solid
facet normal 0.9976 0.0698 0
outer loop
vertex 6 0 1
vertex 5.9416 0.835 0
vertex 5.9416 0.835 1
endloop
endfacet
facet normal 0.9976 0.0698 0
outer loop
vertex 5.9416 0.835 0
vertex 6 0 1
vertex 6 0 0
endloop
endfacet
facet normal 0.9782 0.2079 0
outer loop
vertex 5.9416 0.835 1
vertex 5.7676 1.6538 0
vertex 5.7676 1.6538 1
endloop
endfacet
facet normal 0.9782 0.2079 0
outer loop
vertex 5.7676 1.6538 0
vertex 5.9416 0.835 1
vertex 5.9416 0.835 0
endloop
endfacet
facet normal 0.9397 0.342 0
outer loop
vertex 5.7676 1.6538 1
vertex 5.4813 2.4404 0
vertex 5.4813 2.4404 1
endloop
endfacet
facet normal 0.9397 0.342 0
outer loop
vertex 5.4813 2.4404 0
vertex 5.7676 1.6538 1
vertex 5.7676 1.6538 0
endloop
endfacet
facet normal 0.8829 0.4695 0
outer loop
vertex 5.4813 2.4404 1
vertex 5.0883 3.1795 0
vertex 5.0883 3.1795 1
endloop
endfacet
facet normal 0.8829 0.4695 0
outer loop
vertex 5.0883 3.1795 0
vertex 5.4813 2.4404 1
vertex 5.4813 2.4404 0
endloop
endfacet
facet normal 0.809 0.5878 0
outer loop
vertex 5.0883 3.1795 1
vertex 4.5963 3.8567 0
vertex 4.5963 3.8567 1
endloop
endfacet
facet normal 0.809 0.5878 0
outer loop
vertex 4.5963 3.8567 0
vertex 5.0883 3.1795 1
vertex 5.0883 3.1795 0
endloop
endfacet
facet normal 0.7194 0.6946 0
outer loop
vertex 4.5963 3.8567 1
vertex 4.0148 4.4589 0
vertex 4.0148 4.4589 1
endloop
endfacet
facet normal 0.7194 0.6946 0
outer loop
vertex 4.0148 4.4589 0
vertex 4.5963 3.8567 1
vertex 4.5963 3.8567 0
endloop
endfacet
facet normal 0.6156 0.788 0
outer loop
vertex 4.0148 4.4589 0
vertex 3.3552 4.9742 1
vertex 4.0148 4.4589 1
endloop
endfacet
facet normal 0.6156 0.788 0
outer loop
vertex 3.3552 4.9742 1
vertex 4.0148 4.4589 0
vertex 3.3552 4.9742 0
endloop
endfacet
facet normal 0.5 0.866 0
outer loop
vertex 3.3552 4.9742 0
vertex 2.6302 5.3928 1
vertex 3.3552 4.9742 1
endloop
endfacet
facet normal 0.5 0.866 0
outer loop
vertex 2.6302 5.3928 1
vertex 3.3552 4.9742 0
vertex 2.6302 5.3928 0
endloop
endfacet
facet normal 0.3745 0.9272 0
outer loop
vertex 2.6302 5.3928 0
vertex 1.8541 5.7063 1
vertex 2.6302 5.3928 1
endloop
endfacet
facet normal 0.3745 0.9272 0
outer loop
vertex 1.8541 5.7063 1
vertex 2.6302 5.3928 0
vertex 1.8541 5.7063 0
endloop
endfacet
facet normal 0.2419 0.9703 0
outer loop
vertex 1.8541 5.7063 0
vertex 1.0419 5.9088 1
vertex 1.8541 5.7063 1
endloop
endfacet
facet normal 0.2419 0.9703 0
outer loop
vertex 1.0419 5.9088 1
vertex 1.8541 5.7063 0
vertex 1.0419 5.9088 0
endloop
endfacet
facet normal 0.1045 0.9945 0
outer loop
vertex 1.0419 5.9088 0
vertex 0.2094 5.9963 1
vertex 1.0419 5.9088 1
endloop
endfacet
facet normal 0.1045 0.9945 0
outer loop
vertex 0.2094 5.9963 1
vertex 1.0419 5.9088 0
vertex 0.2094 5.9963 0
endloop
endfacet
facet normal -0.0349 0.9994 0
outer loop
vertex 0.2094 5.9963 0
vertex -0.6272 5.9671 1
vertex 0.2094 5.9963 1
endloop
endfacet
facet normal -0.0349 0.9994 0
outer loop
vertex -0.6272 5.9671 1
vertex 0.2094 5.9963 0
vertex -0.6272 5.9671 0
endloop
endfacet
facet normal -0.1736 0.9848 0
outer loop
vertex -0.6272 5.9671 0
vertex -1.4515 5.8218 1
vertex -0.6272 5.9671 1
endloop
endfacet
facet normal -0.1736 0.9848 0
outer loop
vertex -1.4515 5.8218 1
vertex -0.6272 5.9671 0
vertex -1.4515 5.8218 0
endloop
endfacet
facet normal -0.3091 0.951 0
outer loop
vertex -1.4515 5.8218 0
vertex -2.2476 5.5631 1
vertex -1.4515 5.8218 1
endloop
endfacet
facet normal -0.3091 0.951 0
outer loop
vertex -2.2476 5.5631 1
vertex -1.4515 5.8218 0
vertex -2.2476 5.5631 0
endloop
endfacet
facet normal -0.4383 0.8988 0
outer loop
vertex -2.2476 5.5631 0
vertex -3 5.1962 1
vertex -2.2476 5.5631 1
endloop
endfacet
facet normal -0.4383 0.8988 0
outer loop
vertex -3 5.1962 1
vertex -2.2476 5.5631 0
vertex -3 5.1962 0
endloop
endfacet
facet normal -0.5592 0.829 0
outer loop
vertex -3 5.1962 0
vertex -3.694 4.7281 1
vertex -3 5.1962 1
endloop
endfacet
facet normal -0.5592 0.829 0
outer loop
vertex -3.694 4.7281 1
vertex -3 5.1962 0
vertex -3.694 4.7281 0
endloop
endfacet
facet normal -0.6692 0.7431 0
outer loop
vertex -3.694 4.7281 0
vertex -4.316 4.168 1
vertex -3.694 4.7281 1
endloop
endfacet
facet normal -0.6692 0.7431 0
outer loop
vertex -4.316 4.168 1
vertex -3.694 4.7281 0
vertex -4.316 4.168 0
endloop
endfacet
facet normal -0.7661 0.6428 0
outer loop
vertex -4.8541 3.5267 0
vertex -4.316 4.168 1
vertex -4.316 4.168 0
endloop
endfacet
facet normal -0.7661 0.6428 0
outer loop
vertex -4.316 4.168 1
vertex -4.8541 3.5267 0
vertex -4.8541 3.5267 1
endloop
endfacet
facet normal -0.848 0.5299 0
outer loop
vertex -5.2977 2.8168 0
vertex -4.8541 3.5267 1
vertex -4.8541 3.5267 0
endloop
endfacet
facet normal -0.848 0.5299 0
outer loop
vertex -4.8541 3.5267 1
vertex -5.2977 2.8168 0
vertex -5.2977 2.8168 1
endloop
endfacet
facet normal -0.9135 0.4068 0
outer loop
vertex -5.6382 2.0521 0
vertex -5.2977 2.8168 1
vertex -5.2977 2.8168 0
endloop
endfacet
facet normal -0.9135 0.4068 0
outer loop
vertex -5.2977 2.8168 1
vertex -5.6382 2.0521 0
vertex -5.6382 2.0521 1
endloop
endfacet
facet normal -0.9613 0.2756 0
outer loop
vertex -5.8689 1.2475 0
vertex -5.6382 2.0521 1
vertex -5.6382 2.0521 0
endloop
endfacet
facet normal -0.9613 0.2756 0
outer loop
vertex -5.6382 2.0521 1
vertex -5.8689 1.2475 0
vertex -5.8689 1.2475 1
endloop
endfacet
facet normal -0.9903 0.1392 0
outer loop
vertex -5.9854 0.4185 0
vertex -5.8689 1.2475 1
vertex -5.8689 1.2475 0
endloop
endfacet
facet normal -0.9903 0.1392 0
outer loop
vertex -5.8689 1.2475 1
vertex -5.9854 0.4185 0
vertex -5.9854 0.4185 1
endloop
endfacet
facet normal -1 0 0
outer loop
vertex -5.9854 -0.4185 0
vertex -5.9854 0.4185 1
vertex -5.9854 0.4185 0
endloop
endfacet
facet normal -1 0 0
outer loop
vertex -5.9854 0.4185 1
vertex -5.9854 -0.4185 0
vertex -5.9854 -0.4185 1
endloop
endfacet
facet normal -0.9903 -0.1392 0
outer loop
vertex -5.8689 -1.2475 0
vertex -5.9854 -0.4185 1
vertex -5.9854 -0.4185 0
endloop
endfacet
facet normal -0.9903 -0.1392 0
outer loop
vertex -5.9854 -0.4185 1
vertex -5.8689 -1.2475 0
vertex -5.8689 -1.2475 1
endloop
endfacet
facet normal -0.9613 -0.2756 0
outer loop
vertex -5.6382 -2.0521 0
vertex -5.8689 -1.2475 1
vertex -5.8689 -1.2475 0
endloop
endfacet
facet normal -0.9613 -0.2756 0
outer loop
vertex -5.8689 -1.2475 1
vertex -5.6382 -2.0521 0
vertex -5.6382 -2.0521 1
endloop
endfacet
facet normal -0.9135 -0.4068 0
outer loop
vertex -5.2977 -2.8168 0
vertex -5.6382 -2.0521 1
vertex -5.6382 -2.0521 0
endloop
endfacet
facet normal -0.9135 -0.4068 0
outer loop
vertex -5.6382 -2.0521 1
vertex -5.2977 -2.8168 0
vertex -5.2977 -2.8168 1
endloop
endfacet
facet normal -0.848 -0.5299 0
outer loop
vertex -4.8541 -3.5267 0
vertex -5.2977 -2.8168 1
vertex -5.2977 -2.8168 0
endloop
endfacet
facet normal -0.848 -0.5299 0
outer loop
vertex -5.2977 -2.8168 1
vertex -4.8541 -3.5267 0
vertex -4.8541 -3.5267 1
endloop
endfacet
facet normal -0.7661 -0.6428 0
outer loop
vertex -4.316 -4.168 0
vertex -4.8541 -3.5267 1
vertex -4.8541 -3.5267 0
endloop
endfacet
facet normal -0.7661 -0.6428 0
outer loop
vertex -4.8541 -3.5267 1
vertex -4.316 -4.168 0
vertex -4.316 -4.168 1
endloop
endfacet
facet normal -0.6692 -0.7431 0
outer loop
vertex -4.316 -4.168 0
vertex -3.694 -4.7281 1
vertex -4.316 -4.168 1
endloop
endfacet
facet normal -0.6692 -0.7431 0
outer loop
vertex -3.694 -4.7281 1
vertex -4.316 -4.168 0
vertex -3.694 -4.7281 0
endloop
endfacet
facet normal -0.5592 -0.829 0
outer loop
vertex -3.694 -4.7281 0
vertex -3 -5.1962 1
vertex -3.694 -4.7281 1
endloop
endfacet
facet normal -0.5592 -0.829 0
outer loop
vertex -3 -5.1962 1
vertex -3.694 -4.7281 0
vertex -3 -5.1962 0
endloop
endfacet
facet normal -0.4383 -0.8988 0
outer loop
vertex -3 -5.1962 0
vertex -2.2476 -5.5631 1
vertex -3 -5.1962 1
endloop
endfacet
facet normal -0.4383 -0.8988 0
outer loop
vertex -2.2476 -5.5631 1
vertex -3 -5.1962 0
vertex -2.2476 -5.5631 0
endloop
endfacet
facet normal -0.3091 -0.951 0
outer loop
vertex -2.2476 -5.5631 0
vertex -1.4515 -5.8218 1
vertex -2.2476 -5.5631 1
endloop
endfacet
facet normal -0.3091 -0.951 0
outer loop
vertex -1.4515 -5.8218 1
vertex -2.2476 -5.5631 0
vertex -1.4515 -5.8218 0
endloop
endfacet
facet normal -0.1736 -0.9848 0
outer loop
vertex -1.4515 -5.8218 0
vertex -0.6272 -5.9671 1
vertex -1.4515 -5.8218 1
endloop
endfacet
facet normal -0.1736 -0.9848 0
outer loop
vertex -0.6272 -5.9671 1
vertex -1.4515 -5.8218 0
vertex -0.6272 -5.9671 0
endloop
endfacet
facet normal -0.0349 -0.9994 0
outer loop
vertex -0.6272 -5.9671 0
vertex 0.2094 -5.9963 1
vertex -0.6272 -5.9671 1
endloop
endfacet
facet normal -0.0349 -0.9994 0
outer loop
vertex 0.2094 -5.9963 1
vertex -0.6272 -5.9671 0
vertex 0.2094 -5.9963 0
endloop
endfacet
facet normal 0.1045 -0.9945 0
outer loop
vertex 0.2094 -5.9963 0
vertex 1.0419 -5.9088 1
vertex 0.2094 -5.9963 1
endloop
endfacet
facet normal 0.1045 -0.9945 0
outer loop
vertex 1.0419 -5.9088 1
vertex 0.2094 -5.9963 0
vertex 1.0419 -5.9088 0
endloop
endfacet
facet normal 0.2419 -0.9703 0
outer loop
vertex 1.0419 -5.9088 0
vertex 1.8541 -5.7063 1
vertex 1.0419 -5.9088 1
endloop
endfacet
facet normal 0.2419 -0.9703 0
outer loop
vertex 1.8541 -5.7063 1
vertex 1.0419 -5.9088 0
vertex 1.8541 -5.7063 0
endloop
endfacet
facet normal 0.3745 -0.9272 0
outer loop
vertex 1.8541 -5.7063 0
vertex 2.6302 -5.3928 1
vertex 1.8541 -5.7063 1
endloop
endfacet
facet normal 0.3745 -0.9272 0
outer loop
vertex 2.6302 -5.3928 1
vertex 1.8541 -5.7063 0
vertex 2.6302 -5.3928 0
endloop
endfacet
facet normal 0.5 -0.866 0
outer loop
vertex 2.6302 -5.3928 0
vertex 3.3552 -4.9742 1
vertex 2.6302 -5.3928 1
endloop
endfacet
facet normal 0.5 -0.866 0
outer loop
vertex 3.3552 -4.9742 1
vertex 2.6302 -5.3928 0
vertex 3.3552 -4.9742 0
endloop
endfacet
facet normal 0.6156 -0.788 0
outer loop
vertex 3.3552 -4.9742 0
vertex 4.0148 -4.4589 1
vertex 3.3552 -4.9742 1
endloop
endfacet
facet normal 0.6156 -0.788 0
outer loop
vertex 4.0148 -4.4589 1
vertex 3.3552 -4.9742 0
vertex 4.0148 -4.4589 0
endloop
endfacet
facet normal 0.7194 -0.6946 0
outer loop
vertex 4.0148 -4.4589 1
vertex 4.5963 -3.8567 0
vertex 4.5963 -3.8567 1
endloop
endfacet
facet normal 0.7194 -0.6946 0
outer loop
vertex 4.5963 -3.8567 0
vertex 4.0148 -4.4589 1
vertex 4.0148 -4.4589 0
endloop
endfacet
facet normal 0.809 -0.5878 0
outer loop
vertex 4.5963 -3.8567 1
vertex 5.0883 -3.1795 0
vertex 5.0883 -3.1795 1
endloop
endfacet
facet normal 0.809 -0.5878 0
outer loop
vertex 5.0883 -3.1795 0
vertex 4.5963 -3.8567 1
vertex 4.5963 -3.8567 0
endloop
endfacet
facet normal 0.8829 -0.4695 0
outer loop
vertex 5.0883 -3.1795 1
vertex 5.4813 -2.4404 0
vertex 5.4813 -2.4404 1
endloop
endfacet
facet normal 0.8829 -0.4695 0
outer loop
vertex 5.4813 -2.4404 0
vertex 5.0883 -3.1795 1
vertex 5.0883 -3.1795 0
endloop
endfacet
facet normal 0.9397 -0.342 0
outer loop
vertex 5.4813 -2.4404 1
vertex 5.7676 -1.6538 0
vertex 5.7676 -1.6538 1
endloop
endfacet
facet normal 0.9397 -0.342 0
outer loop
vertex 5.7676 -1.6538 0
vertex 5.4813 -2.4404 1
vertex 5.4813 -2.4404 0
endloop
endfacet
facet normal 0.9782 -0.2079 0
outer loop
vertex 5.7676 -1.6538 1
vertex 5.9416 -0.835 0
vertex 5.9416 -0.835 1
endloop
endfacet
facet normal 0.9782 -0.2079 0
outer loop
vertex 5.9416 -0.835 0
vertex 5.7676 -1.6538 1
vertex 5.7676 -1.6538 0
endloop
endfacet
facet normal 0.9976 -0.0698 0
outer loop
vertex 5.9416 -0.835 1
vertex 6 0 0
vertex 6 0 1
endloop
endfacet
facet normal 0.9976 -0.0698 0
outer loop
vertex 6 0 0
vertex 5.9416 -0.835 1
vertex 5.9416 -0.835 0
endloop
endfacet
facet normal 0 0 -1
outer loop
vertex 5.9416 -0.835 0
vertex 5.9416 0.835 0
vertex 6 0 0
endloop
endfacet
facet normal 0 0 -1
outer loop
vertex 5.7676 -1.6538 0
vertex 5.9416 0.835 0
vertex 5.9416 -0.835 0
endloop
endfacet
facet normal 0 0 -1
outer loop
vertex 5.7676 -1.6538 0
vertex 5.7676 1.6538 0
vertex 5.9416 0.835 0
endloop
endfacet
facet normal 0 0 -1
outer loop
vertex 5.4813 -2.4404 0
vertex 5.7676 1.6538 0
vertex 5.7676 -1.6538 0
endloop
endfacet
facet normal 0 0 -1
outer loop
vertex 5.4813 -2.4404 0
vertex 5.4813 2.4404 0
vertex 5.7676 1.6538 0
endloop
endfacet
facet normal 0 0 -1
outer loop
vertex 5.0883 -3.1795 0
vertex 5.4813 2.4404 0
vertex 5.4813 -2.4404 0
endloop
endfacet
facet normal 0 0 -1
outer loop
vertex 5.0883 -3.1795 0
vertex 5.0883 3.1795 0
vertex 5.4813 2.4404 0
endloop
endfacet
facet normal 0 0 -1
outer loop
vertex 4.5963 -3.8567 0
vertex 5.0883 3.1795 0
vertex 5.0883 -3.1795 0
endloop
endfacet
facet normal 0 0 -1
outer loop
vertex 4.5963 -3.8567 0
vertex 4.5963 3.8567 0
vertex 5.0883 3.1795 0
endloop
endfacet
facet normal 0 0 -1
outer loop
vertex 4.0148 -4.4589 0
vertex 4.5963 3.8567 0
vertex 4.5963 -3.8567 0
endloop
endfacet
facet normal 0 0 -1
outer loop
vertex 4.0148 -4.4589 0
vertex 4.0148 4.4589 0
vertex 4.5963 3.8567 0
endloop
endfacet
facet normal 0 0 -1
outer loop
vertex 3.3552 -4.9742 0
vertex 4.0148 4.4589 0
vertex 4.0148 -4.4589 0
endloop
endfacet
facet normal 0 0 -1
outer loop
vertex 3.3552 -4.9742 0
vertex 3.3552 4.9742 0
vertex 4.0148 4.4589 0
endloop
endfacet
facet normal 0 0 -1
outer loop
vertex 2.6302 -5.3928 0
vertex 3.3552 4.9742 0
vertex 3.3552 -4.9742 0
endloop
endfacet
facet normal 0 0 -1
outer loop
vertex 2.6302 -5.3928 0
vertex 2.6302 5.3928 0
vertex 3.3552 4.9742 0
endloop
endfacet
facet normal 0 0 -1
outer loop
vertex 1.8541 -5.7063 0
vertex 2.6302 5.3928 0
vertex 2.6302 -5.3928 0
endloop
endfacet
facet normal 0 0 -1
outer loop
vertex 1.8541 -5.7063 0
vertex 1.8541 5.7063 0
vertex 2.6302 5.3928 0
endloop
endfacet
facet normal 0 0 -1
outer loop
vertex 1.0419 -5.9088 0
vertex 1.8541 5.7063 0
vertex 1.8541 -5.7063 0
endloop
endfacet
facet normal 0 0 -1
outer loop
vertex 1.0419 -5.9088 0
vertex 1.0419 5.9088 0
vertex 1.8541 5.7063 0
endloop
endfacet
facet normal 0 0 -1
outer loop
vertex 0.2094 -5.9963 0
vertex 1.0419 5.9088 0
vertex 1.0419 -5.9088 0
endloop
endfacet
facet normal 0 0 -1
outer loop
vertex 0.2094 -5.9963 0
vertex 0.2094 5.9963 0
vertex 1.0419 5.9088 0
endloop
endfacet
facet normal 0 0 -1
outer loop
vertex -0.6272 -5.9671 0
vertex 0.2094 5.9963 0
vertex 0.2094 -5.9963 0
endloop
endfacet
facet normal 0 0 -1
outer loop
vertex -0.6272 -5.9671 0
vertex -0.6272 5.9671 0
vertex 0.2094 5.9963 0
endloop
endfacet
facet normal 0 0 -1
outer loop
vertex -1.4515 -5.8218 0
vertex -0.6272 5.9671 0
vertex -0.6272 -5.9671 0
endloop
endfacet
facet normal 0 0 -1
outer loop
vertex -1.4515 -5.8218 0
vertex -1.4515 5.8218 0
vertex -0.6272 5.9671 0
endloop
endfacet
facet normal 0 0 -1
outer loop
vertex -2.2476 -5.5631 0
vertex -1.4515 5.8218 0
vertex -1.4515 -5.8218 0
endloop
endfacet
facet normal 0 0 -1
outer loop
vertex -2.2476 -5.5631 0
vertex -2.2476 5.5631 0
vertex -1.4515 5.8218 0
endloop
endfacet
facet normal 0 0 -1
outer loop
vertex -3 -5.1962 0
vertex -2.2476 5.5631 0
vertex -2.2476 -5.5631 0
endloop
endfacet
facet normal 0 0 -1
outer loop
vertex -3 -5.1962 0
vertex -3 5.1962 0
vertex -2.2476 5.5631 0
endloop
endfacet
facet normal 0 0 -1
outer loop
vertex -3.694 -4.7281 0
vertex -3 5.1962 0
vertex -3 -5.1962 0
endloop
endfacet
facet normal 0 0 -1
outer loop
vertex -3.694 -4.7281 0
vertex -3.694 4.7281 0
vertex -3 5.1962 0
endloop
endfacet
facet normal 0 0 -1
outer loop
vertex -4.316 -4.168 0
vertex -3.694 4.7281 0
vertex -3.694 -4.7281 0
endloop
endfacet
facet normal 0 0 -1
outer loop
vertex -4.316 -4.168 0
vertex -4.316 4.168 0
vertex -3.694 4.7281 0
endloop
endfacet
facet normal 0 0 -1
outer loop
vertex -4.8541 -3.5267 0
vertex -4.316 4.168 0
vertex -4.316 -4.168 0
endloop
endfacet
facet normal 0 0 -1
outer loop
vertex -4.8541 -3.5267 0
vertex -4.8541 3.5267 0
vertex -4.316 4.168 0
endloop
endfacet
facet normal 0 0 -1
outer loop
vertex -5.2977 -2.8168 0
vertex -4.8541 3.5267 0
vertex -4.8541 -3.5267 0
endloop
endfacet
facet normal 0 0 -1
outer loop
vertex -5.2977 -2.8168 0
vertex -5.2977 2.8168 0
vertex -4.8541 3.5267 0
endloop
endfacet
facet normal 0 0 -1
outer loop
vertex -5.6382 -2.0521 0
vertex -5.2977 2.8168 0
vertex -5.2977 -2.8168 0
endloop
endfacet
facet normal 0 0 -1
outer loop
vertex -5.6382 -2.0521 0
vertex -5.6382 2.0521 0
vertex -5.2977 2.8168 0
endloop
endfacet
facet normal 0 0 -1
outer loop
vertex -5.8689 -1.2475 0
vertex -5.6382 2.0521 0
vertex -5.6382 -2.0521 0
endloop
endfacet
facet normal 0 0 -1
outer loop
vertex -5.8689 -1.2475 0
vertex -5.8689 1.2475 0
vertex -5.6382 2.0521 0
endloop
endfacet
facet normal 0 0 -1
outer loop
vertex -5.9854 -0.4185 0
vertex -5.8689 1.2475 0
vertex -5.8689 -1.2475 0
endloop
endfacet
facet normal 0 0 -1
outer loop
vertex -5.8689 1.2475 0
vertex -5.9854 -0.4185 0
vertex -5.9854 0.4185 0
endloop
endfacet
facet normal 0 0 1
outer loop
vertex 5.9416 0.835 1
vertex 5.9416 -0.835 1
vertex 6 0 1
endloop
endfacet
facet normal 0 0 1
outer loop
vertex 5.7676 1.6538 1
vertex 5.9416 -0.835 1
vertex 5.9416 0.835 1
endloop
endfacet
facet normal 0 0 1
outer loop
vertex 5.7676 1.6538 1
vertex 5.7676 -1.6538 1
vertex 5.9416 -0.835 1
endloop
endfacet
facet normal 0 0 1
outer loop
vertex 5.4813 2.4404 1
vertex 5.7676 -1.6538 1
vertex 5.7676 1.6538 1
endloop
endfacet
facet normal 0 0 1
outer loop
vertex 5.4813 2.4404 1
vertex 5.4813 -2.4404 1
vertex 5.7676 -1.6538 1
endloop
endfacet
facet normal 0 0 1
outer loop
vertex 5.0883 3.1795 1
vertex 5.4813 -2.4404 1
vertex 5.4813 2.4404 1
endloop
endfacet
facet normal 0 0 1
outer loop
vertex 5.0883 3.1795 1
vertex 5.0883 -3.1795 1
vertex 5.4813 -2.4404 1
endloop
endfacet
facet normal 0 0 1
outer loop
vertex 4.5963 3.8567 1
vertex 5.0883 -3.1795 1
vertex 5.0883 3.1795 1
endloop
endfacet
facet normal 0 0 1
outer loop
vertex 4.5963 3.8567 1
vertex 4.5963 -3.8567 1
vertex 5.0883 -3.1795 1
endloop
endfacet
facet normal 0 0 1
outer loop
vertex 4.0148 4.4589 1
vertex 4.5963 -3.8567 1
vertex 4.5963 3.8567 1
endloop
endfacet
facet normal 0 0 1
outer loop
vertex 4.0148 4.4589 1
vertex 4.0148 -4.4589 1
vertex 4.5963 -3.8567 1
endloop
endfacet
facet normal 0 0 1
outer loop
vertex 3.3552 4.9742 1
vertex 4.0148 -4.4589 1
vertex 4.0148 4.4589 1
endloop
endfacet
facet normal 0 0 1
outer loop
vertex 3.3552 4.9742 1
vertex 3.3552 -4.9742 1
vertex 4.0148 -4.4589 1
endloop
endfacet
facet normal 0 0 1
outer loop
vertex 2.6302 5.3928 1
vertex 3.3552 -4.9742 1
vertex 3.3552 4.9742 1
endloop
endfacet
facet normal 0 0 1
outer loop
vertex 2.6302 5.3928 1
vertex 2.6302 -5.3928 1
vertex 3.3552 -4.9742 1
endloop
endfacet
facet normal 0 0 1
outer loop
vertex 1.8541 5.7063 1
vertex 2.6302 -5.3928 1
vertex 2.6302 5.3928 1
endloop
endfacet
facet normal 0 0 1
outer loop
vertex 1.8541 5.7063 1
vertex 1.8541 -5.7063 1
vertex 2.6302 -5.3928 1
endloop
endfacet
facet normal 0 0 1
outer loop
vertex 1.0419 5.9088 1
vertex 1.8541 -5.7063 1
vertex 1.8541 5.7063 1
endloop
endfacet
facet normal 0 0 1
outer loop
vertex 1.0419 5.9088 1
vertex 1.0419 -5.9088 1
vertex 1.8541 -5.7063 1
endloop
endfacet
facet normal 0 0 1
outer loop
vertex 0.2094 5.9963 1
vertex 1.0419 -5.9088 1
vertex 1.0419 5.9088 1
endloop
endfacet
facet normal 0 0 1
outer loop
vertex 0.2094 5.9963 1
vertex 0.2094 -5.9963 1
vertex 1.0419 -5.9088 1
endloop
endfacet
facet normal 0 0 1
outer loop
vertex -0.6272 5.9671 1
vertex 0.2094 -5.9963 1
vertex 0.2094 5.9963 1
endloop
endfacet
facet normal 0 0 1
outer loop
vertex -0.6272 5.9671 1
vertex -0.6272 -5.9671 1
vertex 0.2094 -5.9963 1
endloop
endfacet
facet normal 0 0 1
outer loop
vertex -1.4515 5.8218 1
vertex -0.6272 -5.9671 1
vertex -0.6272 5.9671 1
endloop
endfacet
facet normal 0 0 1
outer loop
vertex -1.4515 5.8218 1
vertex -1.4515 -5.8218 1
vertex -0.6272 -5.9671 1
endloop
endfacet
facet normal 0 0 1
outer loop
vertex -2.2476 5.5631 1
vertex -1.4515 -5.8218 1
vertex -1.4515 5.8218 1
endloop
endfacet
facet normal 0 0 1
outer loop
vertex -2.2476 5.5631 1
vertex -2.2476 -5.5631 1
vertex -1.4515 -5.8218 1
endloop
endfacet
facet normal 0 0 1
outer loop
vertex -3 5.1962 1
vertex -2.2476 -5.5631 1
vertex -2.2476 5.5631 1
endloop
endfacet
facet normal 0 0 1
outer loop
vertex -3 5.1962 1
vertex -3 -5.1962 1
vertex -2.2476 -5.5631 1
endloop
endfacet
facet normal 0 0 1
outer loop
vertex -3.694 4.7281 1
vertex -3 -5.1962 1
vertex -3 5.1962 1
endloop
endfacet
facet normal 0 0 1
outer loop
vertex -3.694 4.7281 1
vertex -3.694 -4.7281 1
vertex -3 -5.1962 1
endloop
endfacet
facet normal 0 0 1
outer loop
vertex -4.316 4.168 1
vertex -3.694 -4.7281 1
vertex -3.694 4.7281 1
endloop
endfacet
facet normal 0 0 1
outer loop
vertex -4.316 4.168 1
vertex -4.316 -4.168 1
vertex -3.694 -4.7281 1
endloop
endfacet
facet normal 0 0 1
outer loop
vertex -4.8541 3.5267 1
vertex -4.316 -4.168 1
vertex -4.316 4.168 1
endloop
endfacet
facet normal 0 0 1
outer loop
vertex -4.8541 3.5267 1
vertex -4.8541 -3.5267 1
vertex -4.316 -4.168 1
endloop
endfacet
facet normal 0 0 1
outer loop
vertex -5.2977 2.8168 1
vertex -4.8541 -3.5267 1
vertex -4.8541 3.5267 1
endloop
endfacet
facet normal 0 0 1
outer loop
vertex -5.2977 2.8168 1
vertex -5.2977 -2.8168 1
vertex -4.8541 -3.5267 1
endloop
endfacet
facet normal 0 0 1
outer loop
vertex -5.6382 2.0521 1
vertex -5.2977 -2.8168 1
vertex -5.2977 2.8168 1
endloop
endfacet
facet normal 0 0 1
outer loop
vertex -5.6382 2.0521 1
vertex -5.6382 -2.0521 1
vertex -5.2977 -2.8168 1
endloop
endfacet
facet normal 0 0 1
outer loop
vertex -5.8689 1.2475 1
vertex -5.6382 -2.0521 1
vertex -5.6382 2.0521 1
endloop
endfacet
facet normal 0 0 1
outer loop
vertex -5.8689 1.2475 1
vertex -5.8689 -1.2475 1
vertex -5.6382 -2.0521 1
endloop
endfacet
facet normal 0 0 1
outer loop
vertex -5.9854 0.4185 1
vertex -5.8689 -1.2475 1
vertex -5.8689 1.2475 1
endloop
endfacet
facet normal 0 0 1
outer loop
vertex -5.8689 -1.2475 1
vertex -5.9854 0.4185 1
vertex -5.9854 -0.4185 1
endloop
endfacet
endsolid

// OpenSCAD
module heart() {
    union() {
        cube([10, 10, 1]);
        translate([0, 5, 0]) cylinder(h=1, r=5);
        translate([5, 0, 0]) cylinder(h=1, r=5);
    }
}

module openscad_logo() {
    difference() {
        sphere(5);
        cylinder(h=10, r=2.5, center=true);
        rotate([0, 90, 0]) cylinder(h=10, r=2.5, center=true);
        # rotate([90, 0, 0]) cylinder(h=13, r=2.5, center=true);
    }
}

module guitar_pick() {
    minkowski() {
        union() {
            cube([5, 5, 1]);
            cylinder(h=1, r=5);
        }
        cylinder(h=0.1, r=1);
    }
}

module snowman() {
    sphere(5); // Bottom body
    translate([0, 0, 5]) sphere(4); // Mid body
    translate([0, 0, 9]) sphere(3); // Top body
    translate([0, 0, 10]) cylinder(h=2.5, r=2); // Bottom hat
    translate([0, 0, 12.5]) cylinder(h=2.2, r=1.5); // Top hat
    translate([0, 3, 9]) rotate([90, 0, 0]) cylinder(h=3, r1=0, r2=1.5, center=true); // Nose
    translate([1, 2.35, 10]) sphere(0.5);  // Left eye
    translate([-1, 2.35, 10]) sphere(0.5);  // Right eye
}

module modern_table() {
    resize() cylinder(h=1, r=6);
}

$fn = 45;
// heart();
// openscad_logo();
// guitar_pick();
// snowman();
modern_table();
